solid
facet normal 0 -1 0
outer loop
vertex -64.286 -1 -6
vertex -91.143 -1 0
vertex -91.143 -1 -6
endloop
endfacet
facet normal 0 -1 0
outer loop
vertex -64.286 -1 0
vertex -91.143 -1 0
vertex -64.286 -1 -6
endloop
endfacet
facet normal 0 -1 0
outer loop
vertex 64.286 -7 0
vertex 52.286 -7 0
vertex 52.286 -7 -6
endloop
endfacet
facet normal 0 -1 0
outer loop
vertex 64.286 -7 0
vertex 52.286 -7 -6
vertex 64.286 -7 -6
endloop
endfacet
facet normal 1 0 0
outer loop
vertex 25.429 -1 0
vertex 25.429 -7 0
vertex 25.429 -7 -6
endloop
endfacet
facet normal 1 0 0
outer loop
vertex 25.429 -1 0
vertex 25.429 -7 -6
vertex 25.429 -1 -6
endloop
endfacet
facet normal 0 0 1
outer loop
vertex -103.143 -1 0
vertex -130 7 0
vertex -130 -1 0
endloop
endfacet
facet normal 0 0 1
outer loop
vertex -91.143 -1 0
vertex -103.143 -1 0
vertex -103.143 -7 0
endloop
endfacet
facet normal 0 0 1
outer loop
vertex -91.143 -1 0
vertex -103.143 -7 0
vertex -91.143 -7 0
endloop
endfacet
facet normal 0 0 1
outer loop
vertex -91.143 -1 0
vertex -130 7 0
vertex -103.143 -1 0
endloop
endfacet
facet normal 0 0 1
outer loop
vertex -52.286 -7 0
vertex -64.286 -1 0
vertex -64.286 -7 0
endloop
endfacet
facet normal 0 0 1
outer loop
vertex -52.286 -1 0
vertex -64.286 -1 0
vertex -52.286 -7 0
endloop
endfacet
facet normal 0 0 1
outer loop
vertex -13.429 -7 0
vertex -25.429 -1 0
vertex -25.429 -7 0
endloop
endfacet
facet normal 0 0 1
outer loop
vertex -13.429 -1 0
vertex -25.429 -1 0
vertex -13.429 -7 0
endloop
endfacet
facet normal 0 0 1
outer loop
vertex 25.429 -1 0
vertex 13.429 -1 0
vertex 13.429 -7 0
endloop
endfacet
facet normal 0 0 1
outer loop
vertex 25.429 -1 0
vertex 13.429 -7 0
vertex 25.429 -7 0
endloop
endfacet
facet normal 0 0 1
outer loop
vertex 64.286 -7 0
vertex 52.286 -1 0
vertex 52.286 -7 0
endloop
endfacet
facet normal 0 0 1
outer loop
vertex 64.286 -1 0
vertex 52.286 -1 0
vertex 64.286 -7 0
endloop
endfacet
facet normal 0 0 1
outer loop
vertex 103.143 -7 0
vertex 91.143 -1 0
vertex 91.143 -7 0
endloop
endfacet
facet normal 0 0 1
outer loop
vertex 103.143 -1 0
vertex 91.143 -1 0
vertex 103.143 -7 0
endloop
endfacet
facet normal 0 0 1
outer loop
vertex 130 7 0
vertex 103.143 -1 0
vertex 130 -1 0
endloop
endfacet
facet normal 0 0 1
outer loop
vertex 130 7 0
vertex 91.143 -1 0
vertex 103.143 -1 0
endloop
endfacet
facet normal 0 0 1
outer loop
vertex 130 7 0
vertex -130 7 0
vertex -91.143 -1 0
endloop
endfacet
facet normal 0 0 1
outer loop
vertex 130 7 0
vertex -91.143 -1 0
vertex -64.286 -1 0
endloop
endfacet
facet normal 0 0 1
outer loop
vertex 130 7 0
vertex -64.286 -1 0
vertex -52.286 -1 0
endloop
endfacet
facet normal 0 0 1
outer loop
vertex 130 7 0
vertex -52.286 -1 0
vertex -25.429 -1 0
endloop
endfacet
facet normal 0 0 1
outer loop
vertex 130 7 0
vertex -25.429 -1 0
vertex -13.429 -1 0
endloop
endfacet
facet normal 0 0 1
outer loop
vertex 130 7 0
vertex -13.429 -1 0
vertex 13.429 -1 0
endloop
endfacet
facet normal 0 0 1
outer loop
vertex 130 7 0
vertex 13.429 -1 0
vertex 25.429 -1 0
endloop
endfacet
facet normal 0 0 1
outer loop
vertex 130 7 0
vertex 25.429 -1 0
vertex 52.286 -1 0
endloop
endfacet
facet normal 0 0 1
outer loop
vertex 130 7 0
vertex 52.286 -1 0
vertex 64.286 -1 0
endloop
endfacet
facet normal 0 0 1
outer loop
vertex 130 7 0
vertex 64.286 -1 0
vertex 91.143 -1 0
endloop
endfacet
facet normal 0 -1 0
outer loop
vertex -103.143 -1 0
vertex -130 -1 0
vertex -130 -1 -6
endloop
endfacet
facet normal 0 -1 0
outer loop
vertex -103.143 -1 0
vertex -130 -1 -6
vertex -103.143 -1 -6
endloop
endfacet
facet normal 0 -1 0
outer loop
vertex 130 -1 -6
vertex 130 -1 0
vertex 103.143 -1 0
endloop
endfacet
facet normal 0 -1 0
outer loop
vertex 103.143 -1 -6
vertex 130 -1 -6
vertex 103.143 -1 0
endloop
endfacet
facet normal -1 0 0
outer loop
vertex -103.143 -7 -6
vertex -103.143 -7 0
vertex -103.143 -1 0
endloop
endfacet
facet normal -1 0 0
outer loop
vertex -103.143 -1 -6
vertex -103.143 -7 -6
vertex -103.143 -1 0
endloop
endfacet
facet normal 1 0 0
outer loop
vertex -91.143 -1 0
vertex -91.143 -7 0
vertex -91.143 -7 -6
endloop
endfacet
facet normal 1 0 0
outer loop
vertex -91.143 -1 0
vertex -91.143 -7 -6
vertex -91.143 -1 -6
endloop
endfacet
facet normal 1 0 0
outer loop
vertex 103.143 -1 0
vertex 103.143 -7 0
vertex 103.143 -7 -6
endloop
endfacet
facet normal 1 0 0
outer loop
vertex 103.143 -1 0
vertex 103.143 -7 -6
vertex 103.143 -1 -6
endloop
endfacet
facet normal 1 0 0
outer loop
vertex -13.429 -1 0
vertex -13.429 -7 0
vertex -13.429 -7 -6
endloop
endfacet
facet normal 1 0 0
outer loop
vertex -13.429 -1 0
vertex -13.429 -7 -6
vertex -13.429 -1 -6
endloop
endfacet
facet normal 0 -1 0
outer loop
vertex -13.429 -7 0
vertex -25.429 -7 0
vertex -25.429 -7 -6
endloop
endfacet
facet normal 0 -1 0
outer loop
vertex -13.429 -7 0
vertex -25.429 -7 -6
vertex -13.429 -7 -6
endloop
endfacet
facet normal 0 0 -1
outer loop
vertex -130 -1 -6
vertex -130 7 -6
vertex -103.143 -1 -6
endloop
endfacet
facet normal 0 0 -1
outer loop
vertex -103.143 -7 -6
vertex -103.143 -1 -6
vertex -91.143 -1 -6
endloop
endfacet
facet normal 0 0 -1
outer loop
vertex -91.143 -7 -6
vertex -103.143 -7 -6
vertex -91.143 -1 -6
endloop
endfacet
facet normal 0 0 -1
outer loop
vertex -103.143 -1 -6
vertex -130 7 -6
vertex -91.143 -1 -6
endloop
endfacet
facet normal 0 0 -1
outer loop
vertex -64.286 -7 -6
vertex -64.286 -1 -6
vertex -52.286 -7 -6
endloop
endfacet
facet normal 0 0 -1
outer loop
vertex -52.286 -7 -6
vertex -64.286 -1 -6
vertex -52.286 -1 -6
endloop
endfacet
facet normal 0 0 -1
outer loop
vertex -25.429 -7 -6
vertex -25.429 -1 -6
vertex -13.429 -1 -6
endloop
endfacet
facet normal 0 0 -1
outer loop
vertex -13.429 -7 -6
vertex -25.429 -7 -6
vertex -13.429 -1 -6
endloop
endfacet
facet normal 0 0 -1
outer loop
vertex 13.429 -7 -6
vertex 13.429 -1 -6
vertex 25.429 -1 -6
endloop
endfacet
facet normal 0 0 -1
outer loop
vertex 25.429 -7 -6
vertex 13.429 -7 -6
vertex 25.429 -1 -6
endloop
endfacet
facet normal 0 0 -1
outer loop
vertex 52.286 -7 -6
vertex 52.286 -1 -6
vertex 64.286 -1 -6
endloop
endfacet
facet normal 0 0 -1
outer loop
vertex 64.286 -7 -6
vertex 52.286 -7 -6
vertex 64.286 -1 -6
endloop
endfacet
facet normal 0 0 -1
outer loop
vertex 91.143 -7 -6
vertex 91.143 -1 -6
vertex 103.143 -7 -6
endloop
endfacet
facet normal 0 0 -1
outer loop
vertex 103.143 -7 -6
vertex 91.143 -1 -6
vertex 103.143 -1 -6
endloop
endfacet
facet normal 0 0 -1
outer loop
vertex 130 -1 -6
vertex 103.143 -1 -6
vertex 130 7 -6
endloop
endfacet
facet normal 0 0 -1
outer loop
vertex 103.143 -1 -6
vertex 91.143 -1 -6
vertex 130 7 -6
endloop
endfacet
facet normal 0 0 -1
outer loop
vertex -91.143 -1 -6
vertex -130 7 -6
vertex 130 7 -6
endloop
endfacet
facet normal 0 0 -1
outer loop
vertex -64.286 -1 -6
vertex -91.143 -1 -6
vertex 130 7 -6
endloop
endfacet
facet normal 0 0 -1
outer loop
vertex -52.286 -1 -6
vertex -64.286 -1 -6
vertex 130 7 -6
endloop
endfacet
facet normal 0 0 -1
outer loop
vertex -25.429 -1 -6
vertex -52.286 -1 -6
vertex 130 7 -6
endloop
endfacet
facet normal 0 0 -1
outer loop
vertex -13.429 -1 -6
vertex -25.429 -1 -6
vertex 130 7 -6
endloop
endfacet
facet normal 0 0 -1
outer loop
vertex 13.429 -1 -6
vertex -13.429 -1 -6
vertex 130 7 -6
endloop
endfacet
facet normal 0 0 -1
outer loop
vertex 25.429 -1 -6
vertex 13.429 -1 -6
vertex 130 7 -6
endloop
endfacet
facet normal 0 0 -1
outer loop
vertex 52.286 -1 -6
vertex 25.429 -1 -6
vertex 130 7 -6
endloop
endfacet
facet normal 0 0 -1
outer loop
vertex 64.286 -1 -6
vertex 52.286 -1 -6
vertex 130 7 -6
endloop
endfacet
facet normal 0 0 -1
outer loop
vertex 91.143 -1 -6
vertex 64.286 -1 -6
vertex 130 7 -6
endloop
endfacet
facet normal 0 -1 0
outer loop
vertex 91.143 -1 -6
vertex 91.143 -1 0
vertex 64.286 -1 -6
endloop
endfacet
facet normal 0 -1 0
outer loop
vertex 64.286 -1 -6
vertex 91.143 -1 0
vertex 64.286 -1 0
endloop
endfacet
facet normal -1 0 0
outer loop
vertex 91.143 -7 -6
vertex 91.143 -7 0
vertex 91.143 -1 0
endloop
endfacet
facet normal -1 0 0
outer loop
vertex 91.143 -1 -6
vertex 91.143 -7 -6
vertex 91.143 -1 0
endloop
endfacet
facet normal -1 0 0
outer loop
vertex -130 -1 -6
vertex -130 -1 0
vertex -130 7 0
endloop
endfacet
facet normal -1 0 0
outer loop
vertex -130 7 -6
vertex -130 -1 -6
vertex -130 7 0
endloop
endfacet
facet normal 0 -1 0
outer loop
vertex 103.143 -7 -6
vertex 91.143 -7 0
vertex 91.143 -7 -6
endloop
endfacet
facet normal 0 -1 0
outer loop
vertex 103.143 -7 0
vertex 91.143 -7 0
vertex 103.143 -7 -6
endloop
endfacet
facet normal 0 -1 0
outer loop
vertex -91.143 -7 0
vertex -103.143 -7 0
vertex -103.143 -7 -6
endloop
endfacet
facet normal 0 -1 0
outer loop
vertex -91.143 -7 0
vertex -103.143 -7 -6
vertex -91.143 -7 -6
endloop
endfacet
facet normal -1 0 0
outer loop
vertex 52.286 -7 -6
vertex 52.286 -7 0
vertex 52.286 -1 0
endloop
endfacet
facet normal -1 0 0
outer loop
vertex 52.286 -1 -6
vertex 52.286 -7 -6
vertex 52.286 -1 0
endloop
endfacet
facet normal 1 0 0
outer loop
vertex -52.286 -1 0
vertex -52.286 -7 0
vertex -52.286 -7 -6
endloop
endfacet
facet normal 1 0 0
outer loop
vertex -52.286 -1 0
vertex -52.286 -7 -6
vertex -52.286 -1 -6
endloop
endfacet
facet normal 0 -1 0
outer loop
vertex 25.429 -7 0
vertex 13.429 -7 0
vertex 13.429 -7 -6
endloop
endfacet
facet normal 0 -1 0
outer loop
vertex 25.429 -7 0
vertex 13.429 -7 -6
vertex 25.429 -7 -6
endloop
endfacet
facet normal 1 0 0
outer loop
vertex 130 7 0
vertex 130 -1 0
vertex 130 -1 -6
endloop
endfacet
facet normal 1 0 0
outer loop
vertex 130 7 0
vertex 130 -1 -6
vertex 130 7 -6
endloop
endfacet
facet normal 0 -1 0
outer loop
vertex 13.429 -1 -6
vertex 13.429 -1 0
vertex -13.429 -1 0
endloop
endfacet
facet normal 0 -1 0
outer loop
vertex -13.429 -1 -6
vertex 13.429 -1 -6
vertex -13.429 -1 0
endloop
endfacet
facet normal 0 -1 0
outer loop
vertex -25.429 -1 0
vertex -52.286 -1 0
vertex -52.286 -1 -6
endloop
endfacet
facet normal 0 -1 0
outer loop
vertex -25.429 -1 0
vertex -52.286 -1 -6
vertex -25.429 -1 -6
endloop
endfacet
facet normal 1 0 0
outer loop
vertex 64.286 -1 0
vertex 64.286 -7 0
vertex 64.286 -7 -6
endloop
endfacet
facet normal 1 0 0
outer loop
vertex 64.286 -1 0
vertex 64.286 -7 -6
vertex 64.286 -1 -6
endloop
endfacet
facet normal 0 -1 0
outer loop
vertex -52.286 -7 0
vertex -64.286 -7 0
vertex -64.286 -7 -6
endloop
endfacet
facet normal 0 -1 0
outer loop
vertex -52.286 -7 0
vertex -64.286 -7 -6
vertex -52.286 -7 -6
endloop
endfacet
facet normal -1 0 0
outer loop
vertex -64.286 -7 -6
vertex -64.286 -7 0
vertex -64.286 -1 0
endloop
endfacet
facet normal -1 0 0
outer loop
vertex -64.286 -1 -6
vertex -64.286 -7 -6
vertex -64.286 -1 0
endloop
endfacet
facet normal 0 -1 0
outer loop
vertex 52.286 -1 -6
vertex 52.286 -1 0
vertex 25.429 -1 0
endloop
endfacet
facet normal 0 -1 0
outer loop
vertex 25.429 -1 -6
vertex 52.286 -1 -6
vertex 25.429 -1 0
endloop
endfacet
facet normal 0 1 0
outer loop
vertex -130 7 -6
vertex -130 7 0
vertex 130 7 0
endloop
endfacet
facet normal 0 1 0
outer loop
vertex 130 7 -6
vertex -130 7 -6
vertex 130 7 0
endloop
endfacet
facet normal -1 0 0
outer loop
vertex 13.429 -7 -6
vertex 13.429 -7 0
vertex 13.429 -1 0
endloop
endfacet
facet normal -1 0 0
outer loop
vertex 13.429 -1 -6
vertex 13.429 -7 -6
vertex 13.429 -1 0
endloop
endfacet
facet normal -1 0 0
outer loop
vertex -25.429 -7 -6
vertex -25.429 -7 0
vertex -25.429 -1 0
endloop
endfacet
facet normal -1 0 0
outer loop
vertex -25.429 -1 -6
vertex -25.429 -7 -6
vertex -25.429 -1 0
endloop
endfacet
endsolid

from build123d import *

# Parameters (mm, degrees)
SKETCH1_W           = 260
SKETCH1_H           = 14
BOSS_EXTRUDE1_DEPTH = 6
SKETCH3_W           = 26.857142857
SKETCH3_H           = 6
SKETCH3_W_2         = 13.428571429
CUT_EXTRUDE1_DEPTH  = 7


with BuildPart() as part:
    # Sketch1 → Boss-Extrude1 (new body)
    with BuildSketch(Plane.XY):
        Rectangle(SKETCH1_W, SKETCH1_H)
    extrude(amount=-BOSS_EXTRUDE1_DEPTH)

    # Sketch3 → Cut-Extrude1 (cut, through all)
    with BuildSketch(Plane.XY):
        with Locations((-116.571428572, -4)):
            Rectangle(SKETCH3_W, SKETCH3_H)
        with Locations((-77.714285714, -4)):
            Rectangle(SKETCH3_W, SKETCH3_H)
        with Locations((-38.857142858, -4)):
            Rectangle(SKETCH3_W, SKETCH3_H)
        with Locations((-6.714285715, -4)):
            Rectangle(SKETCH3_W_2, SKETCH3_H)
    cut_extrude1 = extrude(amount=-CUT_EXTRUDE1_DEPTH, mode=Mode.SUBTRACT)

    # Mirror1: Cut-Extrude1 across plane
    add(cut_extrude1.mirror(Plane(origin=(0, 0, 0), x_dir=(0, 0, 1), z_dir=(1, 0, 0))), mode=Mode.SUBTRACT)


solid = part.part
